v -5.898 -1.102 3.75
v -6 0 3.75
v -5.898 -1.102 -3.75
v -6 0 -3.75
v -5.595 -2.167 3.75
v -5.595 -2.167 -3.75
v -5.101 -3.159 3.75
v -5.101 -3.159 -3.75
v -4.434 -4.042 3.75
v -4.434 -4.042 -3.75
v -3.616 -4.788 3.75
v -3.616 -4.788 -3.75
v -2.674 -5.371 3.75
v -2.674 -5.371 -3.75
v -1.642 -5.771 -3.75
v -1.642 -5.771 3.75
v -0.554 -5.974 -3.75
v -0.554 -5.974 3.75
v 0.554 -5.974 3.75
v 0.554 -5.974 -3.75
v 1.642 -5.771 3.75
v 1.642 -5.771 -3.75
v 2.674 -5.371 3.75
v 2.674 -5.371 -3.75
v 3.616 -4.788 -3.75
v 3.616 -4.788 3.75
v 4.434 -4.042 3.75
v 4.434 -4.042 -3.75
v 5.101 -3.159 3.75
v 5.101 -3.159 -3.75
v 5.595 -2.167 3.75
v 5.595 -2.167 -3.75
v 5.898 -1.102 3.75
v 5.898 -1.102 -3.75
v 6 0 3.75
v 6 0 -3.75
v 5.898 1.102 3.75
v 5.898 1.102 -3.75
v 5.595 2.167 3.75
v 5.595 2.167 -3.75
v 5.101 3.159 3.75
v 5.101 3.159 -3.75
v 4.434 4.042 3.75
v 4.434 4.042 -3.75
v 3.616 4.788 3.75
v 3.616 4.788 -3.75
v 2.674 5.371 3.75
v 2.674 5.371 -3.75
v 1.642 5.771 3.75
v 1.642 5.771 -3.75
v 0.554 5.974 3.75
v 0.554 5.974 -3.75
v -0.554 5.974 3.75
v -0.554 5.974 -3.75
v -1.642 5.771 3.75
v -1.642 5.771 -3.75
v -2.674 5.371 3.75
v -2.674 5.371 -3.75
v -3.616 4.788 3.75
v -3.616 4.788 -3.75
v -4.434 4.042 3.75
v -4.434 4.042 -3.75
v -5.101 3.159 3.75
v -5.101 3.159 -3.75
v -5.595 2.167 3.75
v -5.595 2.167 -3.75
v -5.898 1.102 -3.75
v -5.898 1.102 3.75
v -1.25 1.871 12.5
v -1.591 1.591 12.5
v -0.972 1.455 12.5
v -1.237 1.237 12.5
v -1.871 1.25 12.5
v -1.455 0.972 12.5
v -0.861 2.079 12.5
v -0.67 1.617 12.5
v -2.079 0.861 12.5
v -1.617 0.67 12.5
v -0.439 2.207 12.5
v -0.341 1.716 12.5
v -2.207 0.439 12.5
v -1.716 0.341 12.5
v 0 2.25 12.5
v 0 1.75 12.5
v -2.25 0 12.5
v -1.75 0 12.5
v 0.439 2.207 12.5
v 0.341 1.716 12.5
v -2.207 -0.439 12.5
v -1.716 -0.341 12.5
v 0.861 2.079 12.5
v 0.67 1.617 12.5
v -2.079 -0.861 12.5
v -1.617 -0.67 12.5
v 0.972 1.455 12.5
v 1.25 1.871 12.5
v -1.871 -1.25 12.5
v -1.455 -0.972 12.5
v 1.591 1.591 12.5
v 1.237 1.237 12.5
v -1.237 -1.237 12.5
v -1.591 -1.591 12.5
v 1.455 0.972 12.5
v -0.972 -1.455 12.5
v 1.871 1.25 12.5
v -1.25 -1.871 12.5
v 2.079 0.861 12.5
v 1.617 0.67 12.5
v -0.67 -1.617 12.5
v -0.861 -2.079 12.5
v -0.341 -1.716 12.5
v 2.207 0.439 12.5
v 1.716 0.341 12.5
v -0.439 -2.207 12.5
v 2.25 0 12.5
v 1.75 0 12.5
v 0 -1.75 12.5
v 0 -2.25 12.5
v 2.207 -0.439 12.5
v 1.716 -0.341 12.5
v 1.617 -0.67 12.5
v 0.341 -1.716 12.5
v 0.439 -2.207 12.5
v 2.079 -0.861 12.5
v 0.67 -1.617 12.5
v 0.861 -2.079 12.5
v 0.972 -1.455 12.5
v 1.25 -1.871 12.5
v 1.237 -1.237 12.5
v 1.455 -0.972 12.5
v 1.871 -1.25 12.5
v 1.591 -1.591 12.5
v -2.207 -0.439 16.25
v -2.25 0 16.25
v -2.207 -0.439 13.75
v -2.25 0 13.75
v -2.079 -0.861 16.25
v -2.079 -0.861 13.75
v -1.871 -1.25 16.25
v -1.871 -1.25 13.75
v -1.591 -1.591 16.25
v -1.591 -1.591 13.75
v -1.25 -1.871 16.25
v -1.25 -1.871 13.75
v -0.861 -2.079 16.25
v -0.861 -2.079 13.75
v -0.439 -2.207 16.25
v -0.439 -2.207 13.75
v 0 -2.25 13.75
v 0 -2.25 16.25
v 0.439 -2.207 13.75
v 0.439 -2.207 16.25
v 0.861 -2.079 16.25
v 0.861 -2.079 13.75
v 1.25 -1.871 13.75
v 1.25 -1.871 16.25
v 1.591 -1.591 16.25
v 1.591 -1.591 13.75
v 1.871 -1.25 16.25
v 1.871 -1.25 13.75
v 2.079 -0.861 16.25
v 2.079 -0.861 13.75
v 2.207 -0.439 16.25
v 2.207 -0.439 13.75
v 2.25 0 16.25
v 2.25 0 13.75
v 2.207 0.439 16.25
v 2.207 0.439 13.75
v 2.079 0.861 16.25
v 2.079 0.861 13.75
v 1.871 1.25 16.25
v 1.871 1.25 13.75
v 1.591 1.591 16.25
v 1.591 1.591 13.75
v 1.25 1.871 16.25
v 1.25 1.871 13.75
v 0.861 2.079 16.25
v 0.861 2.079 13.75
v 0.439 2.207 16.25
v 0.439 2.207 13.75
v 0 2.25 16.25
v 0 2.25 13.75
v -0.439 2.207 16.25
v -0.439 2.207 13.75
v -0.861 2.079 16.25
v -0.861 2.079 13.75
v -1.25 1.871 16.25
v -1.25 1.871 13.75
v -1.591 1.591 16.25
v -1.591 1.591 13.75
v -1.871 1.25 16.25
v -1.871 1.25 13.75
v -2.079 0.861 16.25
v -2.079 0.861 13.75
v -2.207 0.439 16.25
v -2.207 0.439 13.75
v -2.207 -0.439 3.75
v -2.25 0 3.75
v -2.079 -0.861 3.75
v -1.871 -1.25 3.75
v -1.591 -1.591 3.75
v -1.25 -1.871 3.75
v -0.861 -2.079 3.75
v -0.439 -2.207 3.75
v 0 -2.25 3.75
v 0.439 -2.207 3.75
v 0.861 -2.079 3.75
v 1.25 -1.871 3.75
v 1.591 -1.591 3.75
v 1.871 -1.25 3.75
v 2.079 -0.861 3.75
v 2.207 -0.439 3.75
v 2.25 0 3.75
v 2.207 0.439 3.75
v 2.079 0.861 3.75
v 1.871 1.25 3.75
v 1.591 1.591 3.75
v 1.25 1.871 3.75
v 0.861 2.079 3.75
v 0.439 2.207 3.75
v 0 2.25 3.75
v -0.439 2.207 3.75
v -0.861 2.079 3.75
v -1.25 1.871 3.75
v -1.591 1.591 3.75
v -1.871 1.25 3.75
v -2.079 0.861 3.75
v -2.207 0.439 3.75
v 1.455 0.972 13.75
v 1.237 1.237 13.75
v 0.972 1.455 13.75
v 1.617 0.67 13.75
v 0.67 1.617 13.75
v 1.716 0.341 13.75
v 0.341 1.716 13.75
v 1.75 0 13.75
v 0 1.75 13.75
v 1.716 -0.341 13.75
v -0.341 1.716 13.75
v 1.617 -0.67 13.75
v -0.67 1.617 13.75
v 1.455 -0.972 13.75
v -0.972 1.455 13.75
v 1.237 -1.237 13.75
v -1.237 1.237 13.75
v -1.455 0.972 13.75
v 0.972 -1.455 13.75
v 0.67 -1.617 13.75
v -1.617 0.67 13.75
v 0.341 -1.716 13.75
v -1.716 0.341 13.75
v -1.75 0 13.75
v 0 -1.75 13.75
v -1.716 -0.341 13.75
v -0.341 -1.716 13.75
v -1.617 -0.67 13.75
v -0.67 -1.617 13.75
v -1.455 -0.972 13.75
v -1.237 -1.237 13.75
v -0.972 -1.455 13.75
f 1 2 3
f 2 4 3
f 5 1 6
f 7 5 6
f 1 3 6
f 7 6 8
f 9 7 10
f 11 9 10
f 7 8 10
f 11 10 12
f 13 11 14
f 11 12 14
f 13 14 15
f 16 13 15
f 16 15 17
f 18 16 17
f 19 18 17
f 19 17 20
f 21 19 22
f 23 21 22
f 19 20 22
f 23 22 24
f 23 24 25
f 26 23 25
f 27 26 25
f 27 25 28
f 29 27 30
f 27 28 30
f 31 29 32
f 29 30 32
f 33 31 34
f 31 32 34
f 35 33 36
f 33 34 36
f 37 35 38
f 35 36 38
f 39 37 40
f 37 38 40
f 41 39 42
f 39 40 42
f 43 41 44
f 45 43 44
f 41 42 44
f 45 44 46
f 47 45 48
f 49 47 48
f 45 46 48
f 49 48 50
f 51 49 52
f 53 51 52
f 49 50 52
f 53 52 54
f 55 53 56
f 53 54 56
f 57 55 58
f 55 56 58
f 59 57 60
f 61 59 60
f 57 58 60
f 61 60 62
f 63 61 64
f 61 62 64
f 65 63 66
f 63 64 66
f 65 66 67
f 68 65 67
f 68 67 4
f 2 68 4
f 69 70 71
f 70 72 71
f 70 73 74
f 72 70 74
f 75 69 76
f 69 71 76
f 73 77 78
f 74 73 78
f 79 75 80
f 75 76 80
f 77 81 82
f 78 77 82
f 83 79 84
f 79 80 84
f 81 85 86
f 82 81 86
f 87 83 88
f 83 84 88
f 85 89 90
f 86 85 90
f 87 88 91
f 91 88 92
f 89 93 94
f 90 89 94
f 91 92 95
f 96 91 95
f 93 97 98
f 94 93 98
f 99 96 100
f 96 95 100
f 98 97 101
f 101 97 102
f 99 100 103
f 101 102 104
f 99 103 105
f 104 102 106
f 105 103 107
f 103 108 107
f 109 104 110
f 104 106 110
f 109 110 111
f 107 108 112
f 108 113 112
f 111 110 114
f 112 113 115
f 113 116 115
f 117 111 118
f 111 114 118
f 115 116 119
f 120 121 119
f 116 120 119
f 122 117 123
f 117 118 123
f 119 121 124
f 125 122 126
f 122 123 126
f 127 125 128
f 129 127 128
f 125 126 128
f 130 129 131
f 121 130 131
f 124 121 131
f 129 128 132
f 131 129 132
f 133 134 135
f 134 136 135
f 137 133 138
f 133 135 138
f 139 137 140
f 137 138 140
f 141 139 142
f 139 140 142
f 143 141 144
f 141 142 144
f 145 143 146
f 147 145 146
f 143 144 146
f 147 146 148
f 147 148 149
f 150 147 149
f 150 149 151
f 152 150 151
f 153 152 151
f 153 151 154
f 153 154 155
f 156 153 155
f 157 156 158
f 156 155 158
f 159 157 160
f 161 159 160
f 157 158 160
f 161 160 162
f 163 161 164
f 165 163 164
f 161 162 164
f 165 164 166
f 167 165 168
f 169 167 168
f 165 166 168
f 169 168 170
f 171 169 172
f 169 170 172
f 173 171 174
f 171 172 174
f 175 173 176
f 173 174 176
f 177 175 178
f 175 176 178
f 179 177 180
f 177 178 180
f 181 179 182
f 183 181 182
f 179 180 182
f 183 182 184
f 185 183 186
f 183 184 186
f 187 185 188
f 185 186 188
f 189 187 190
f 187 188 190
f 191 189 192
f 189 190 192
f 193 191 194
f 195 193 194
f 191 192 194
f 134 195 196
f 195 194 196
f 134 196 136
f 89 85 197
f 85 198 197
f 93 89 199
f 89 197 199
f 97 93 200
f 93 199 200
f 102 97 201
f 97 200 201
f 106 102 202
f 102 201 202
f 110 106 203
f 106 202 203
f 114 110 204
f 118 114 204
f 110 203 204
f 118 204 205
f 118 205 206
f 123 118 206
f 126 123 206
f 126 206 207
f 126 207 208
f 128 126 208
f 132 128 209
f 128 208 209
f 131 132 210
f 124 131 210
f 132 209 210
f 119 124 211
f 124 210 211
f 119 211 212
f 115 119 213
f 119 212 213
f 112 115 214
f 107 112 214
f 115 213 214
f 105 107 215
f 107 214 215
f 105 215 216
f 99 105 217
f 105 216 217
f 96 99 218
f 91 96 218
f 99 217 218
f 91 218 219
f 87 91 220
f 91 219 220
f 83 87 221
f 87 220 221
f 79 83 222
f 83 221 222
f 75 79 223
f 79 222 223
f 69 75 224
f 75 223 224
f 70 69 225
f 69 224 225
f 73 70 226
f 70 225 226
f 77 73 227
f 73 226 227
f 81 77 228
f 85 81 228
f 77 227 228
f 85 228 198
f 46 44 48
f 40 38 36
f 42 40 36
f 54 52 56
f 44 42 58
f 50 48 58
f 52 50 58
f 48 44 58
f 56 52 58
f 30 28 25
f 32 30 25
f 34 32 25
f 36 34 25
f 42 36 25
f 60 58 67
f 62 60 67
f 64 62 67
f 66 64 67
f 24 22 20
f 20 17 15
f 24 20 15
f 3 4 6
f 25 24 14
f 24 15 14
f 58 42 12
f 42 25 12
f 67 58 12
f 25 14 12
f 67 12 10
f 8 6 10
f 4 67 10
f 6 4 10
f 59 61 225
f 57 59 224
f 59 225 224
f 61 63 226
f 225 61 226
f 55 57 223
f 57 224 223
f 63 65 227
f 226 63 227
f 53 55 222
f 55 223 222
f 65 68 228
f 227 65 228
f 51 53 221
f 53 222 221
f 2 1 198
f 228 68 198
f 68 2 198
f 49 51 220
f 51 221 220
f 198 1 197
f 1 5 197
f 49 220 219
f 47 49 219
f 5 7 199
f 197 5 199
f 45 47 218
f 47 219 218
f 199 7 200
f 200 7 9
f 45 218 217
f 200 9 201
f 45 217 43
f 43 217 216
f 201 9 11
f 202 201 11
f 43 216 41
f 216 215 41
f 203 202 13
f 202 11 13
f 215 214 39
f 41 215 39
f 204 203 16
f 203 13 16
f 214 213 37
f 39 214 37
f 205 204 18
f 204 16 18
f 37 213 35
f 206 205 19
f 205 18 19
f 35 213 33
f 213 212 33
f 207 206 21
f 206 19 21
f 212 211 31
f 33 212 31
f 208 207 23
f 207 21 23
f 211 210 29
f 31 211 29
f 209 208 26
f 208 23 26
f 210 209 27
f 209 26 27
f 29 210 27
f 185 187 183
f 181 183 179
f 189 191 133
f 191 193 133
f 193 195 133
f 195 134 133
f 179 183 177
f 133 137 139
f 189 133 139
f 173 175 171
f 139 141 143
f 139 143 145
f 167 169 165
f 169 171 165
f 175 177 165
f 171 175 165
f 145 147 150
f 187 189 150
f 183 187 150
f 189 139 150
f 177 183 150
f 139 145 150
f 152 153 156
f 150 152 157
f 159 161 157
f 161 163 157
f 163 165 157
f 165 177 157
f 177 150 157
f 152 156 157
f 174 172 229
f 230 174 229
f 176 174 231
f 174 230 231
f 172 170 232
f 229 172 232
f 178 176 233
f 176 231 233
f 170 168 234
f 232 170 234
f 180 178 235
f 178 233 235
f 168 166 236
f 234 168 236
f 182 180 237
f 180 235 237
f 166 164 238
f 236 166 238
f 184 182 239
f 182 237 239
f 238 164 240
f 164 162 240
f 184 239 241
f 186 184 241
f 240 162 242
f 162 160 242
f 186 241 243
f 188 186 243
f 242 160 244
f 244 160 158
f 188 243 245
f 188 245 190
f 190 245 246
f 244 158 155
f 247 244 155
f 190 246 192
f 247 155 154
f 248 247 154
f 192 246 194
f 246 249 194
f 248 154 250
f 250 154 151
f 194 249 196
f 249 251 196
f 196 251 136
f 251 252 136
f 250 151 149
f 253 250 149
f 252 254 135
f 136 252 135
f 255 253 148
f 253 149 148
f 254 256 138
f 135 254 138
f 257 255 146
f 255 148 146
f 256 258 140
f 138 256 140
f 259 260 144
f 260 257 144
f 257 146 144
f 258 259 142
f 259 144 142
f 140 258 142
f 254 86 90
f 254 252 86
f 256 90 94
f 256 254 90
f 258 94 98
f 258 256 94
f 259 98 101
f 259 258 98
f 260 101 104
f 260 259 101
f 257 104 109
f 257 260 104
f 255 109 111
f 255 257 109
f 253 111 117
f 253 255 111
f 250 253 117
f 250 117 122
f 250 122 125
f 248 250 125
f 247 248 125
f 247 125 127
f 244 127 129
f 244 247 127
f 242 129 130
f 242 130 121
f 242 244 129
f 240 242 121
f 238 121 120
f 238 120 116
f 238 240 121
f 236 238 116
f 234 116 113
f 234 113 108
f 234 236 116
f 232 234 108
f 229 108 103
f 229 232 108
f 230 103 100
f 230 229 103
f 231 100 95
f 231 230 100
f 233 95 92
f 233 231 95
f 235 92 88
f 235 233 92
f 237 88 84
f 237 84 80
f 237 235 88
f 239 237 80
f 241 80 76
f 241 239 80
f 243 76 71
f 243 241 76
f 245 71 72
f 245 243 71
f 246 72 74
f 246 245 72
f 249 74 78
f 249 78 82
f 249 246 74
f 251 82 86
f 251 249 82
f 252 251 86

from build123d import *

# Parameters (mm, degrees)
F0_W = 1.75
F0_H = 1.25


with BuildPart() as f1:
    # F0 (on Front) → F1 (revolve)
    with BuildSketch(Plane.XZ):
        with Locations((-0.875, 13.125)):
            Rectangle(F0_W, F0_H)
        Polygon((-2.25, 16.25), (-2.25, 13.75), (-1.75, 13.75), (0, 13.75), (0, 16.25), align=None)
        Polygon((-2.25, 12.5), (-2.25, 3.75), (0, 3.75), (0, 12.5), (-1.75, 12.5), align=None)
        Polygon((-2.25, 3.75), (-6, 3.75), (-6, -3.75), (0, -3.75), (0, 3.75), align=None)
    revolve(axis=Axis((0, 0, 6.25), (0, 0, 1)))


solid = f1.part
